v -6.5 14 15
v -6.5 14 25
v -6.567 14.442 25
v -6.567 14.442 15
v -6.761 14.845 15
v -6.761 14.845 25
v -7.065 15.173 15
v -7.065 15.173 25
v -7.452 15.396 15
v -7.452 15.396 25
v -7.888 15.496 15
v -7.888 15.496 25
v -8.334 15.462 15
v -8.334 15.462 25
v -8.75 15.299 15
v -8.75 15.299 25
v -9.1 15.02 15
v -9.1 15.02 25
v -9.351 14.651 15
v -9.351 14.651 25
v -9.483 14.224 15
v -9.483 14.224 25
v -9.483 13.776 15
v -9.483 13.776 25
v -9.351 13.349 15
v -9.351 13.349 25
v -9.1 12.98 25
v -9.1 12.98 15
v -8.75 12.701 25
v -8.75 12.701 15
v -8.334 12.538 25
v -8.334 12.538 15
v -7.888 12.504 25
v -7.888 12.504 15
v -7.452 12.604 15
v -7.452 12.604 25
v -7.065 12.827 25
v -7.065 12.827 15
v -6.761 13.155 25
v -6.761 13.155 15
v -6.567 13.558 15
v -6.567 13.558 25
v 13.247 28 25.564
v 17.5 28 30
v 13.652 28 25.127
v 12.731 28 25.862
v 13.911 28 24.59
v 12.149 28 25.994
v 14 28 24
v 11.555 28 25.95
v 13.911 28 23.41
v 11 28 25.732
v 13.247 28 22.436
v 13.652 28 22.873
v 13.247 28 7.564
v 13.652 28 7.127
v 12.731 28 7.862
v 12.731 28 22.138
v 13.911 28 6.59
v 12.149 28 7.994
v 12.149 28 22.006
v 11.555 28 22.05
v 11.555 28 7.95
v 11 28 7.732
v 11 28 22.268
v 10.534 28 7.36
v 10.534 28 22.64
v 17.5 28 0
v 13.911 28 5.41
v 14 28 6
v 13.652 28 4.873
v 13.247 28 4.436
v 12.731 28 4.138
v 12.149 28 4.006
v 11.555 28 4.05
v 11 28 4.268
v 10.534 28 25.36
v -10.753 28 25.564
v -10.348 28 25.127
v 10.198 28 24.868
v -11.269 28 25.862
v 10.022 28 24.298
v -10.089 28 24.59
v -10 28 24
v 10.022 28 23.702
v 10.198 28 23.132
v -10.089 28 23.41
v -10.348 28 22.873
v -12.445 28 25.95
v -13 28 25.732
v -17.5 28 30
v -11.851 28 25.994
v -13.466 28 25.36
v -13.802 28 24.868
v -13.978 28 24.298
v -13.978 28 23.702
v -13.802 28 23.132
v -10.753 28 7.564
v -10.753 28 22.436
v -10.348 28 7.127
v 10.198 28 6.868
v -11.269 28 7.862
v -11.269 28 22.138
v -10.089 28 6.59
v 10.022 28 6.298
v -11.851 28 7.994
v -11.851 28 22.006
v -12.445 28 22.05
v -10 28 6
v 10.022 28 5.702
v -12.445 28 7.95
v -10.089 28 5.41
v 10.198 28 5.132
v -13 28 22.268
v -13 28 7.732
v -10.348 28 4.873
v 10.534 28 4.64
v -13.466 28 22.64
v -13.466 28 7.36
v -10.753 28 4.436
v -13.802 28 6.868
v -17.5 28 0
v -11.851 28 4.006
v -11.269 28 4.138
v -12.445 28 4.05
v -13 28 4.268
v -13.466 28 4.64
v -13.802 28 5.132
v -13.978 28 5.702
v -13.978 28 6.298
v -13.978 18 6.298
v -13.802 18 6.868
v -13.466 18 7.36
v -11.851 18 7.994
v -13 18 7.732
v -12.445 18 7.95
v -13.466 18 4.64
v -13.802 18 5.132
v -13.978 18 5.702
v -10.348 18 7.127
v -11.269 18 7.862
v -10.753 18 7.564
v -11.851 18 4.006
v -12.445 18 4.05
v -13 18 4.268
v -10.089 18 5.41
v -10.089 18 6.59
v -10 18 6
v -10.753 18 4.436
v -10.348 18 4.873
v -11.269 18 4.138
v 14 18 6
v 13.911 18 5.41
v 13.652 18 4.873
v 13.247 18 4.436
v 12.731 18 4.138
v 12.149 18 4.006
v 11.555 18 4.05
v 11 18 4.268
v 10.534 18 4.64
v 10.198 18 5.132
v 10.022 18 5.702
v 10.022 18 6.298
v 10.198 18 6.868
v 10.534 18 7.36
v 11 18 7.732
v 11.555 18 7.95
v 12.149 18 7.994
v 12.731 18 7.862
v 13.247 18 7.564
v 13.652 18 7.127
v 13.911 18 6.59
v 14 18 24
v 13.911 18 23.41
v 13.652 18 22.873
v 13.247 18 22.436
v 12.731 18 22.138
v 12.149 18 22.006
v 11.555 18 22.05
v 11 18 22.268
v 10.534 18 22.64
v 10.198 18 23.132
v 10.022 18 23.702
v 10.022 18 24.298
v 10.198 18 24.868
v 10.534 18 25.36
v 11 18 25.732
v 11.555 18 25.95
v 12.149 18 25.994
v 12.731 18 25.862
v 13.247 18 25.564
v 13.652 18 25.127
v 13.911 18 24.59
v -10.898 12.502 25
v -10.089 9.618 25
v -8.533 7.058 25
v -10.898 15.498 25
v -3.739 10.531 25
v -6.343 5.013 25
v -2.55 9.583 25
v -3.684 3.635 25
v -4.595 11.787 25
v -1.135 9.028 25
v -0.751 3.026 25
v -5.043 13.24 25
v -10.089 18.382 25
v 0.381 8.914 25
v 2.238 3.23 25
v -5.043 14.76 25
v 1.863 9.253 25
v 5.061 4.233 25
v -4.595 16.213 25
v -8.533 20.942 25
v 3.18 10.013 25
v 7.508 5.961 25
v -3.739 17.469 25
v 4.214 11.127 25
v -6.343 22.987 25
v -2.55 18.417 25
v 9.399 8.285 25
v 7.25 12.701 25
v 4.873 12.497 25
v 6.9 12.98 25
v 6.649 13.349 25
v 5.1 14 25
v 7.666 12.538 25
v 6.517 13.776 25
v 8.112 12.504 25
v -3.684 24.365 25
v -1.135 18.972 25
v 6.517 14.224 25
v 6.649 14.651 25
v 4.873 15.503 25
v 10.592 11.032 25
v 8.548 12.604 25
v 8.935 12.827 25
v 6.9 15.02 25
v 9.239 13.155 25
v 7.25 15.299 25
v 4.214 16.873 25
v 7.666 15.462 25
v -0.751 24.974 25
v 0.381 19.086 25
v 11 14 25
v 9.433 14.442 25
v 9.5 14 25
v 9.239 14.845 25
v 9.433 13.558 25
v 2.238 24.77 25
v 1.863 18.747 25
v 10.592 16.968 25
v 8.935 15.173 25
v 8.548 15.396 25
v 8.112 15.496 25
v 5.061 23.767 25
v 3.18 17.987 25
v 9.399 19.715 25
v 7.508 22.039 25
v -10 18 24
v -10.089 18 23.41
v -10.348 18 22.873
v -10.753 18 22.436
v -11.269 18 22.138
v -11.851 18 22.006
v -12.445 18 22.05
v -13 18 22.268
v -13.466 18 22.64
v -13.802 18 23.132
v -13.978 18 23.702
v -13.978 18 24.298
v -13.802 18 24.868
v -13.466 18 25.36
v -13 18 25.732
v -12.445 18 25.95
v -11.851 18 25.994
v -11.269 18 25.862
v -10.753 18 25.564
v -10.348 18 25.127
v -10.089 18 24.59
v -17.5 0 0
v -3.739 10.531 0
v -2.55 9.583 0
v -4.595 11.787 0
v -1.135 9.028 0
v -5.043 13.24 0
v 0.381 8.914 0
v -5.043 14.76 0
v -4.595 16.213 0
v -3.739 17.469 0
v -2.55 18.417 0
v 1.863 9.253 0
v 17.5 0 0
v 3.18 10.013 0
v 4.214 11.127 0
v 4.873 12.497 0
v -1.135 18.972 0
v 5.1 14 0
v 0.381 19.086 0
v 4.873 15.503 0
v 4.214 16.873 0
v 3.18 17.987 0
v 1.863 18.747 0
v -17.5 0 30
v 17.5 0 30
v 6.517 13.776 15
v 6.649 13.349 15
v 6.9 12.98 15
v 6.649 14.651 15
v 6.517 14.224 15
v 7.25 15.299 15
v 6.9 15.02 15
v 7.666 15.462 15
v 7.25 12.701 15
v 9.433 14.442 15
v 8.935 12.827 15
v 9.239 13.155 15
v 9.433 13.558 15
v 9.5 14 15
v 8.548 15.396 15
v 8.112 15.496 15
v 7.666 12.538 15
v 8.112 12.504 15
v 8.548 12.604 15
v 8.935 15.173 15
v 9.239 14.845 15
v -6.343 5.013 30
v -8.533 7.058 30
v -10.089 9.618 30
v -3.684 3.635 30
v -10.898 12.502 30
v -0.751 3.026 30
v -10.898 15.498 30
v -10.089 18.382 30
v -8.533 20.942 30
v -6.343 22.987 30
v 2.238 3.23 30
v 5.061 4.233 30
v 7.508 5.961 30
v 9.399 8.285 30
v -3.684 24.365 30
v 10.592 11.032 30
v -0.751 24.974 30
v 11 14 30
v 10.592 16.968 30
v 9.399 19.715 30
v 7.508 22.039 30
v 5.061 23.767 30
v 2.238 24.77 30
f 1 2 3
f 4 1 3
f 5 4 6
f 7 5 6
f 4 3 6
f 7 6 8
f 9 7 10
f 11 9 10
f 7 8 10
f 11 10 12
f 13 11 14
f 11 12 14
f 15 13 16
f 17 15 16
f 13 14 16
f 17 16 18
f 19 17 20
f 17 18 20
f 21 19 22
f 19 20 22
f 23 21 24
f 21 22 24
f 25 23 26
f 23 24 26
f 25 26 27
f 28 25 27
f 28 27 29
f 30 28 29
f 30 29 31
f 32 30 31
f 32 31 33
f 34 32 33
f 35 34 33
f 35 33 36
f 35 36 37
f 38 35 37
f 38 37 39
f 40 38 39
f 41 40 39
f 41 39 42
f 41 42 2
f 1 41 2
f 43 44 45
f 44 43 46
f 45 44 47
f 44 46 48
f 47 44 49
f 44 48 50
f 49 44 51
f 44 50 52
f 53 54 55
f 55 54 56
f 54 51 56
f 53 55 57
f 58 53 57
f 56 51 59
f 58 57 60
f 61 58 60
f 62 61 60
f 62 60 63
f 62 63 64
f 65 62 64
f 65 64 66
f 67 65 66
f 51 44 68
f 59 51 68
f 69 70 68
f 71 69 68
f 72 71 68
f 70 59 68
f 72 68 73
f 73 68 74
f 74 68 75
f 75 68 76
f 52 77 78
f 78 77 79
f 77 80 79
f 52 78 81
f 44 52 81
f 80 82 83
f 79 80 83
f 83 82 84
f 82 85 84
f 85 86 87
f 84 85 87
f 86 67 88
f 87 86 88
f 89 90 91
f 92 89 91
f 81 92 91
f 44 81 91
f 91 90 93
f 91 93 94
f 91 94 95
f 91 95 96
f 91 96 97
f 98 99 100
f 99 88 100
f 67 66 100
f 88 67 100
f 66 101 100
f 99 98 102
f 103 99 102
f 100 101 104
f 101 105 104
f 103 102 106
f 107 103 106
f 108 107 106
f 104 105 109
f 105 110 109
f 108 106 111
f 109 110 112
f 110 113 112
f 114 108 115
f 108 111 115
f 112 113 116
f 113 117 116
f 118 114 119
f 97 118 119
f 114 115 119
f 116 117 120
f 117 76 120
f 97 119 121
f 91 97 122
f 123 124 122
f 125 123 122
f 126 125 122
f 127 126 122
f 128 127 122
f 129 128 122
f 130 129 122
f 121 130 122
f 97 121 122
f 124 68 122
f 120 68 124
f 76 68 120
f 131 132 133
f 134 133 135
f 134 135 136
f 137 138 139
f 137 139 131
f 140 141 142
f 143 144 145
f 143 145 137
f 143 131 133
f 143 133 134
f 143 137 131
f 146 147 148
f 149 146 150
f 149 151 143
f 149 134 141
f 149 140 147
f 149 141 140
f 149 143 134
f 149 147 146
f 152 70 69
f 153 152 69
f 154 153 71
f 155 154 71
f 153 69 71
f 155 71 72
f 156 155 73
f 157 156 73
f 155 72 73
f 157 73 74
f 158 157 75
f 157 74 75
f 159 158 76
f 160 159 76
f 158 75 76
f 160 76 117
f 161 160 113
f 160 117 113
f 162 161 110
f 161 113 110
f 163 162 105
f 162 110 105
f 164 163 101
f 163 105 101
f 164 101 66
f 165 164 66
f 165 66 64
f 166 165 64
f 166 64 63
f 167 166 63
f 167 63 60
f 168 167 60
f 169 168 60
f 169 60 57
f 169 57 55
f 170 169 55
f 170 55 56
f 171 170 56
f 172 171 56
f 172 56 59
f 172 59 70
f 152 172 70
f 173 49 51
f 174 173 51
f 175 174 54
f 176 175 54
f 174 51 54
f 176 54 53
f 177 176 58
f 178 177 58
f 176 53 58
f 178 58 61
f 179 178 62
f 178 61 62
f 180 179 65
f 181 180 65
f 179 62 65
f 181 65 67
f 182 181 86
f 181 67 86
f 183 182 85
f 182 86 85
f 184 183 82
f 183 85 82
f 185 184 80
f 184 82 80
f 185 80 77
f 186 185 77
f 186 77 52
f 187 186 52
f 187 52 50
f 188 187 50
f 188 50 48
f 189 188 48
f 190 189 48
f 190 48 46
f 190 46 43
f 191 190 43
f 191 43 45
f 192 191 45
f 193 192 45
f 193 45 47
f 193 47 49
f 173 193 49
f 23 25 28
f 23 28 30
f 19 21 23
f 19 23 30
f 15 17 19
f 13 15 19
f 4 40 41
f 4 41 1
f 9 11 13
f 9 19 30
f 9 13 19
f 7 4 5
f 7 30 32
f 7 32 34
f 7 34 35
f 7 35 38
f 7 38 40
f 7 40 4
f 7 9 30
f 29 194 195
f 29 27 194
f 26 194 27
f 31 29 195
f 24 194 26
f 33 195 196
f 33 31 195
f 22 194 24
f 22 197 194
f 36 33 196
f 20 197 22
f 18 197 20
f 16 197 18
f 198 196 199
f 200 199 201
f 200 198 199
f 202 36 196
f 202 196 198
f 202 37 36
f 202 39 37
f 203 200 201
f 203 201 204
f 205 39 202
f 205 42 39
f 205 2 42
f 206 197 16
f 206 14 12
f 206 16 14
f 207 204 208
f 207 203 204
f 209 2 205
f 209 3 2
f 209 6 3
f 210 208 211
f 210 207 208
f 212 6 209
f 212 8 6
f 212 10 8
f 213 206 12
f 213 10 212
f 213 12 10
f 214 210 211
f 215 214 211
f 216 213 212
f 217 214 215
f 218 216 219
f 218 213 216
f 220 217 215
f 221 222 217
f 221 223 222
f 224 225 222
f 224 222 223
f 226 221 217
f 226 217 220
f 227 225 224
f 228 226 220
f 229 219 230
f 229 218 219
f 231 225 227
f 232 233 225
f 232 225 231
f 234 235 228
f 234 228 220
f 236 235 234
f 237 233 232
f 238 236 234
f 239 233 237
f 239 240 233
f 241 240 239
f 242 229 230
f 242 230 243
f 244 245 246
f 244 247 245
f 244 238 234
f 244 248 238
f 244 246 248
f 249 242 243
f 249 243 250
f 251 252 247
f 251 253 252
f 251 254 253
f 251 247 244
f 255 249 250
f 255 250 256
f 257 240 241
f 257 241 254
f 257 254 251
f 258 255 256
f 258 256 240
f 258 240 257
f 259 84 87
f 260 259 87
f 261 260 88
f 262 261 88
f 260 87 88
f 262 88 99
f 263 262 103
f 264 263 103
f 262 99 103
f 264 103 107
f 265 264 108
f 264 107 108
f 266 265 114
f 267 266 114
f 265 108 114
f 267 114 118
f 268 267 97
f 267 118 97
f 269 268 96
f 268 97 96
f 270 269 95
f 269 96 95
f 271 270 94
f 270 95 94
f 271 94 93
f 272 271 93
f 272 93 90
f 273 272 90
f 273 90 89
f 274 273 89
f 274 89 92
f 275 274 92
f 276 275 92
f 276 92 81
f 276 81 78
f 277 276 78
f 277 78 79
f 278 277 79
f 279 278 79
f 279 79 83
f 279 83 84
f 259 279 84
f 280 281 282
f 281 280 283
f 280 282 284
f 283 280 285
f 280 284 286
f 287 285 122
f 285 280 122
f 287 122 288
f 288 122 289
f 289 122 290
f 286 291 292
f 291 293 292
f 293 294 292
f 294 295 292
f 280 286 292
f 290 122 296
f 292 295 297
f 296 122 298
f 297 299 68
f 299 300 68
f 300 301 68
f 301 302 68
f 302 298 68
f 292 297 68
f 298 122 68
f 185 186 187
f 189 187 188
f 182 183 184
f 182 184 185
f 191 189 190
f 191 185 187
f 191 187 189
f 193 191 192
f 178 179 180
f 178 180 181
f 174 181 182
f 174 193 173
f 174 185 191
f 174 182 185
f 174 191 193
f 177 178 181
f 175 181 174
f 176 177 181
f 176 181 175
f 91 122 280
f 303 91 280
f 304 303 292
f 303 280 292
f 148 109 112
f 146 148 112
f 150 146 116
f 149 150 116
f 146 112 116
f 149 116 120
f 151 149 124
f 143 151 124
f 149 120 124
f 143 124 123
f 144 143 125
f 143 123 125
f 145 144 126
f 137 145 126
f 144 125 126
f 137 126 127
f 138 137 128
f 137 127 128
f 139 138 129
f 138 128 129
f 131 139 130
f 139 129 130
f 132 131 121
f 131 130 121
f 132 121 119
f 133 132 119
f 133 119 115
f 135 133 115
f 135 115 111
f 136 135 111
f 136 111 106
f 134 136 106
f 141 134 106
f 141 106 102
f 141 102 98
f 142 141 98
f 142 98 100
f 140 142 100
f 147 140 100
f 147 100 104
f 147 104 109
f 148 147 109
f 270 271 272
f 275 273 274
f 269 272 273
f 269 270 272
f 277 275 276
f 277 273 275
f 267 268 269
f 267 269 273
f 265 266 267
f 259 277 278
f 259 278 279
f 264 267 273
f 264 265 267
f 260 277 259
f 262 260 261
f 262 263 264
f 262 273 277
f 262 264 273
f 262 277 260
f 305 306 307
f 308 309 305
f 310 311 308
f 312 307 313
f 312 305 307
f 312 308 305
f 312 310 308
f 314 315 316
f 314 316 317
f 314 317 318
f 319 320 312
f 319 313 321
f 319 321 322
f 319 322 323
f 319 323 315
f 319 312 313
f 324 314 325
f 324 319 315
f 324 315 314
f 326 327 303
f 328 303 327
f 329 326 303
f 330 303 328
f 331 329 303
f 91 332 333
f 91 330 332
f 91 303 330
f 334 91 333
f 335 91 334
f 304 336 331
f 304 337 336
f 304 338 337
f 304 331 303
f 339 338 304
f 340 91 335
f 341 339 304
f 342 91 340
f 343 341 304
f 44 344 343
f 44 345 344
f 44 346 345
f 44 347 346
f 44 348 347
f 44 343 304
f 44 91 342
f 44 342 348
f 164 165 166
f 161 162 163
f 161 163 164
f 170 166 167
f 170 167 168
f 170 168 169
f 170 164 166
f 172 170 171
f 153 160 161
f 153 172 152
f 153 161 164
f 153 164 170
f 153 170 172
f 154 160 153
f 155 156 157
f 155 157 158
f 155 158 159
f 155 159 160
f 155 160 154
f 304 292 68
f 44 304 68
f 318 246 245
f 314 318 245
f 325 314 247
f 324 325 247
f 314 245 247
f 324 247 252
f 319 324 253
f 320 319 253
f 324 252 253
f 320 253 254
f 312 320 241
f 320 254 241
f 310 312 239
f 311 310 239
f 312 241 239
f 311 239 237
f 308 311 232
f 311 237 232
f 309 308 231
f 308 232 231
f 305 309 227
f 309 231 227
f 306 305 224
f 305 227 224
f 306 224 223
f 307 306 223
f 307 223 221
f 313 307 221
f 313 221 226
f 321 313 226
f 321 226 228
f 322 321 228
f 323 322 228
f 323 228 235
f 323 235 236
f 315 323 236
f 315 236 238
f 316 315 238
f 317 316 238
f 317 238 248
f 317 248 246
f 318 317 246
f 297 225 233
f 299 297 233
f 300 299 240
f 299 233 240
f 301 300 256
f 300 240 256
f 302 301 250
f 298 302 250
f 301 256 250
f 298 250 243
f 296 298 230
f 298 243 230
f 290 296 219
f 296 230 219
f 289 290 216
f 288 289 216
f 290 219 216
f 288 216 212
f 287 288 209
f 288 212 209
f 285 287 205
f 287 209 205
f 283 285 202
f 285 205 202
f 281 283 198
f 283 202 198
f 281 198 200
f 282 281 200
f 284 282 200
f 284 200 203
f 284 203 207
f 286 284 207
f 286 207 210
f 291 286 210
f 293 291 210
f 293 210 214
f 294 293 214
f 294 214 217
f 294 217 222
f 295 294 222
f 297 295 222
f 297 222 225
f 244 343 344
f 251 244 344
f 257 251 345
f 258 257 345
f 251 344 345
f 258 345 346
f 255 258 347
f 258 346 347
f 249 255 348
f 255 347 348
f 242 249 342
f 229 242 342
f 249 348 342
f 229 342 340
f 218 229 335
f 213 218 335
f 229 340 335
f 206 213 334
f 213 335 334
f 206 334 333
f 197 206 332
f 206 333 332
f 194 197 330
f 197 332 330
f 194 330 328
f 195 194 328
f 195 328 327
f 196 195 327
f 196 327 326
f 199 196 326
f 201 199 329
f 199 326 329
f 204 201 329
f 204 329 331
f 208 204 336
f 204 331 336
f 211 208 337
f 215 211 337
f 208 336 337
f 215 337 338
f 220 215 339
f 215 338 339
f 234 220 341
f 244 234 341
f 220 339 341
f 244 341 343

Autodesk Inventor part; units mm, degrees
ref_plane "YZ Plane" through (0, 0, 0) normal (1, 0, 0) x (0, 1, 0)
ref_plane "XZ Plane" through (0, 0, 0) normal (0, 1, 0) x (-1, 0, 0)
ref_plane "XY Plane" through (0, 0, 0) normal (0, 0, 1) x (1, 0, 0)
sketch "Sketch1" plane through (0, 0, 0) normal (0, 0, 1) x (1, 0, 0)
  line L0 (0, 0) -> (17.5, 0)
  line L1 (17.5, 0) -> (17.5, 28)
  line L2 (17.5, 28) -> (-17.5, 28)
  line L3 (-17.5, 28) -> (-17.5, 0)
  line L4 (-17.5, 0) -> (17.5, 0)
  dimension "d0" = 17.5
  dimension "d1" = 28
  dimension "d2" = 35
extrude "Extrusion1" add sketch "Sketch1" along normal blind 30
sketch "Sketch2" plane through (0, 0, 30) normal (0, 0, 1) x (1, 0, 0)
  circle A0 centre (0, 14) radius 5.1
  line L0 (17.5, 28) -> (-17.5, 28) projected
  line L1 (-17.5, 28) -> (-17.5, 0) projected
  point P0 (0, 0)
  dimension "d5" = 10.2
  dimension "d6" = 14
  dimension "d85" = 17.5
extrude "Extrusion2" cut sketch "Sketch2" against normal blind 30
sketch "Sketch4" plane through (-17.5, 28, 0) normal (0, 1, 0) x (1, 0, 0)
  line L0 (0, -30) -> (35, -30) projected
  line L1 (17.5, -30) -> (17.5, 3.7121)
  line L2 (0, 0) -> (0, -30) projected
  circle A0 centre (29.5, -6) radius 2
  circle A1 centre (5.5, -6) radius 2
  line L3 (34, -15) -> (-3.2563, -15)
  line L4 (35, 0) -> (0, 0) projected
  circle A2 centre (29.5, -24) radius 2
  circle A3 centre (5.5, -24) radius 2
  line L5 (35, 0) -> (35, -30) projected
  dimension "d37" = 17.5
  dimension "d38" = 4
  dimension "d39" = 4
  dimension "d42" = 15
  dimension "d43" = 4
  dimension "d44" = 4
  dimension "d61" = 6
  dimension "d62" = 6
  dimension "d63" = 6
  dimension "d64" = 6
  dimension "d86" = 12
  dimension "d87" = 12
  dimension "d88" = 12
  dimension "d89" = 12
extrude "Extrusion4" cut sketch "Sketch4" against normal blind 10 contours A0 | A1 | A2 | A3
thread "Thread7" size "M4x0.7" class "6H" standard "ANSI Metric M Profile" length 10
thread "Thread8" size "M4x0.7" class "6H" standard "ANSI Metric M Profile" full length
thread "Thread9" size "M4x0.7" class "6H" standard "ANSI Metric M Profile" length 10
thread "Thread10" size "M4x0.7" class "6H" standard "ANSI Metric M Profile" length 10
sketch "Sketch7" plane through (0, 0, 30) normal (0, 0, 1) x (1, 0, 0)
  circle A0 centre (0, 14) radius 5.1 projected
  circle A1 centre (0, 14) radius 11
  point P0 (0, 0)
  dimension "d72" = 22
extrude "Extrusion5" cut sketch "Sketch7" against normal blind 5
sketch "Sketch9" plane through (0, 14, 25) normal (0, 0, 1) x (1, 0, 0)
  circle A0 centre (-8, 0) radius 1.5
  circle A1 centre (8, 0) radius 1.5
  point P0 (0, -14)
  dimension "d76" = 3
  dimension "d78" = 3
extrude "Extrusion6" cut sketch "Sketch9" against normal blind 10
thread "Thread11" size "M3x0.5" class "6H" standard "ANSI Metric M Profile" length 10
thread "Thread12" size "M3x0.5" class "6H" standard "ANSI Metric M Profile" length 10
properties part number "AoVitmeT8"
